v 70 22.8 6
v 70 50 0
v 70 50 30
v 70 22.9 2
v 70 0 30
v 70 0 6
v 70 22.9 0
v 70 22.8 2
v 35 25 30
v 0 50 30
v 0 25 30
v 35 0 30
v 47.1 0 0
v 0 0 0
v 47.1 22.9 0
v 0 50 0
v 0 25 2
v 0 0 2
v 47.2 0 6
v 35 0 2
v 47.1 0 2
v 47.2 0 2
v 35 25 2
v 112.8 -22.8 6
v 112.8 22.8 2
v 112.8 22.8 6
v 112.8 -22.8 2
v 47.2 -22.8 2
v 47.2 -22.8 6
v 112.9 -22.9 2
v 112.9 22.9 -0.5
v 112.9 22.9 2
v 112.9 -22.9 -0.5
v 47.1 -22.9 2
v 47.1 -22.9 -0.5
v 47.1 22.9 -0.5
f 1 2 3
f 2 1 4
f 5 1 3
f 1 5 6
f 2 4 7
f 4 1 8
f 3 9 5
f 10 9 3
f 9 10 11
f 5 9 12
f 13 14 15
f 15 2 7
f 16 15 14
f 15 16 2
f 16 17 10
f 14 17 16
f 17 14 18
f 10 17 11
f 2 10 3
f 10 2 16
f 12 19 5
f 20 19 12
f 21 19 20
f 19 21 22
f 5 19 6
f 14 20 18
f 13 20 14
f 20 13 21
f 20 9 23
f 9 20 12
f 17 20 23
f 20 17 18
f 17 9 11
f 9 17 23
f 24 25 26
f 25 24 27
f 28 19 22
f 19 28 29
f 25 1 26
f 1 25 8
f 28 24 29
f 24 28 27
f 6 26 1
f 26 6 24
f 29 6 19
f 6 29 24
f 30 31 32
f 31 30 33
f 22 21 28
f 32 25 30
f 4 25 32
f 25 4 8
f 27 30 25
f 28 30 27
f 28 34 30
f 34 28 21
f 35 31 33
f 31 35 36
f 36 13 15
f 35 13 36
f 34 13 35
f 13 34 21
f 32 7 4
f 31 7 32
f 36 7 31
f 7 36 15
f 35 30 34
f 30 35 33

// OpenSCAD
// Two-part enclosure for small electronics board (e.g. Arduino-based logger)
// Print orientation: box standing on the bed, lid flat on top in the +X gap

// ---------- Parameters ----------
box_x      = 70;    // box outer length (X)
box_y      = 50;    // box outer width (Y)
box_z      = 30;    // box outer height (Z)
box_wall   = 2;     // box wall thickness (X and Y)
box_floor  = 2;     // box floor thickness

lip_x      = 65.6;  // lip outer length (X)
lip_y      = 45.6;  // lip outer width (Y)
lip_thk    = 1.5;   // lip wall thickness
lip_h      = 4;     // lip height from plate

plate_t    = 2;     // lid plate thickness

gap        = 10;    // gap between box and lid (X)

eps        = 0.5;   // cutter overshoot past faces

$fn = 64;

// ---------- Modules ----------
module box() {
    difference() {
        cube([box_x, box_y, box_z]);
        // Open-top cavity (extends past top face to avoid coplanar faces)
        translate([-box_x/2, -box_y/2, box_floor])
            cube([box_x, box_y, box_z - box_floor + eps]);
    }
}

module lid() {
    union() {
        // Base plate
        translate([-lip_x/2, -lip_y/2, 0])
            cube([lip_x, lip_y, plate_t]);

        // Rectangular lip on top of the plate
        translate([-lip_x/2, -lip_y/2, plate_t])
            cube([lip_x, lip_y, lip_h]);
    }

    // Lip opening: outer size 65.6 x 45.6 mm with 0.2 mm clearance on each side
    translate([-lip_x/2 - 0.1, -lip_y/2 - 0.1, -eps])
        cube([lip_x + 0.2, lip_y + 0.2, plate_t + eps]);
}

// ---------- Assembly ----------
union() {
    box();

    // Lid placed on the +X side of the box, separated by the gap
    translate([box_x + gap, 0, 0])
        lid();
}
